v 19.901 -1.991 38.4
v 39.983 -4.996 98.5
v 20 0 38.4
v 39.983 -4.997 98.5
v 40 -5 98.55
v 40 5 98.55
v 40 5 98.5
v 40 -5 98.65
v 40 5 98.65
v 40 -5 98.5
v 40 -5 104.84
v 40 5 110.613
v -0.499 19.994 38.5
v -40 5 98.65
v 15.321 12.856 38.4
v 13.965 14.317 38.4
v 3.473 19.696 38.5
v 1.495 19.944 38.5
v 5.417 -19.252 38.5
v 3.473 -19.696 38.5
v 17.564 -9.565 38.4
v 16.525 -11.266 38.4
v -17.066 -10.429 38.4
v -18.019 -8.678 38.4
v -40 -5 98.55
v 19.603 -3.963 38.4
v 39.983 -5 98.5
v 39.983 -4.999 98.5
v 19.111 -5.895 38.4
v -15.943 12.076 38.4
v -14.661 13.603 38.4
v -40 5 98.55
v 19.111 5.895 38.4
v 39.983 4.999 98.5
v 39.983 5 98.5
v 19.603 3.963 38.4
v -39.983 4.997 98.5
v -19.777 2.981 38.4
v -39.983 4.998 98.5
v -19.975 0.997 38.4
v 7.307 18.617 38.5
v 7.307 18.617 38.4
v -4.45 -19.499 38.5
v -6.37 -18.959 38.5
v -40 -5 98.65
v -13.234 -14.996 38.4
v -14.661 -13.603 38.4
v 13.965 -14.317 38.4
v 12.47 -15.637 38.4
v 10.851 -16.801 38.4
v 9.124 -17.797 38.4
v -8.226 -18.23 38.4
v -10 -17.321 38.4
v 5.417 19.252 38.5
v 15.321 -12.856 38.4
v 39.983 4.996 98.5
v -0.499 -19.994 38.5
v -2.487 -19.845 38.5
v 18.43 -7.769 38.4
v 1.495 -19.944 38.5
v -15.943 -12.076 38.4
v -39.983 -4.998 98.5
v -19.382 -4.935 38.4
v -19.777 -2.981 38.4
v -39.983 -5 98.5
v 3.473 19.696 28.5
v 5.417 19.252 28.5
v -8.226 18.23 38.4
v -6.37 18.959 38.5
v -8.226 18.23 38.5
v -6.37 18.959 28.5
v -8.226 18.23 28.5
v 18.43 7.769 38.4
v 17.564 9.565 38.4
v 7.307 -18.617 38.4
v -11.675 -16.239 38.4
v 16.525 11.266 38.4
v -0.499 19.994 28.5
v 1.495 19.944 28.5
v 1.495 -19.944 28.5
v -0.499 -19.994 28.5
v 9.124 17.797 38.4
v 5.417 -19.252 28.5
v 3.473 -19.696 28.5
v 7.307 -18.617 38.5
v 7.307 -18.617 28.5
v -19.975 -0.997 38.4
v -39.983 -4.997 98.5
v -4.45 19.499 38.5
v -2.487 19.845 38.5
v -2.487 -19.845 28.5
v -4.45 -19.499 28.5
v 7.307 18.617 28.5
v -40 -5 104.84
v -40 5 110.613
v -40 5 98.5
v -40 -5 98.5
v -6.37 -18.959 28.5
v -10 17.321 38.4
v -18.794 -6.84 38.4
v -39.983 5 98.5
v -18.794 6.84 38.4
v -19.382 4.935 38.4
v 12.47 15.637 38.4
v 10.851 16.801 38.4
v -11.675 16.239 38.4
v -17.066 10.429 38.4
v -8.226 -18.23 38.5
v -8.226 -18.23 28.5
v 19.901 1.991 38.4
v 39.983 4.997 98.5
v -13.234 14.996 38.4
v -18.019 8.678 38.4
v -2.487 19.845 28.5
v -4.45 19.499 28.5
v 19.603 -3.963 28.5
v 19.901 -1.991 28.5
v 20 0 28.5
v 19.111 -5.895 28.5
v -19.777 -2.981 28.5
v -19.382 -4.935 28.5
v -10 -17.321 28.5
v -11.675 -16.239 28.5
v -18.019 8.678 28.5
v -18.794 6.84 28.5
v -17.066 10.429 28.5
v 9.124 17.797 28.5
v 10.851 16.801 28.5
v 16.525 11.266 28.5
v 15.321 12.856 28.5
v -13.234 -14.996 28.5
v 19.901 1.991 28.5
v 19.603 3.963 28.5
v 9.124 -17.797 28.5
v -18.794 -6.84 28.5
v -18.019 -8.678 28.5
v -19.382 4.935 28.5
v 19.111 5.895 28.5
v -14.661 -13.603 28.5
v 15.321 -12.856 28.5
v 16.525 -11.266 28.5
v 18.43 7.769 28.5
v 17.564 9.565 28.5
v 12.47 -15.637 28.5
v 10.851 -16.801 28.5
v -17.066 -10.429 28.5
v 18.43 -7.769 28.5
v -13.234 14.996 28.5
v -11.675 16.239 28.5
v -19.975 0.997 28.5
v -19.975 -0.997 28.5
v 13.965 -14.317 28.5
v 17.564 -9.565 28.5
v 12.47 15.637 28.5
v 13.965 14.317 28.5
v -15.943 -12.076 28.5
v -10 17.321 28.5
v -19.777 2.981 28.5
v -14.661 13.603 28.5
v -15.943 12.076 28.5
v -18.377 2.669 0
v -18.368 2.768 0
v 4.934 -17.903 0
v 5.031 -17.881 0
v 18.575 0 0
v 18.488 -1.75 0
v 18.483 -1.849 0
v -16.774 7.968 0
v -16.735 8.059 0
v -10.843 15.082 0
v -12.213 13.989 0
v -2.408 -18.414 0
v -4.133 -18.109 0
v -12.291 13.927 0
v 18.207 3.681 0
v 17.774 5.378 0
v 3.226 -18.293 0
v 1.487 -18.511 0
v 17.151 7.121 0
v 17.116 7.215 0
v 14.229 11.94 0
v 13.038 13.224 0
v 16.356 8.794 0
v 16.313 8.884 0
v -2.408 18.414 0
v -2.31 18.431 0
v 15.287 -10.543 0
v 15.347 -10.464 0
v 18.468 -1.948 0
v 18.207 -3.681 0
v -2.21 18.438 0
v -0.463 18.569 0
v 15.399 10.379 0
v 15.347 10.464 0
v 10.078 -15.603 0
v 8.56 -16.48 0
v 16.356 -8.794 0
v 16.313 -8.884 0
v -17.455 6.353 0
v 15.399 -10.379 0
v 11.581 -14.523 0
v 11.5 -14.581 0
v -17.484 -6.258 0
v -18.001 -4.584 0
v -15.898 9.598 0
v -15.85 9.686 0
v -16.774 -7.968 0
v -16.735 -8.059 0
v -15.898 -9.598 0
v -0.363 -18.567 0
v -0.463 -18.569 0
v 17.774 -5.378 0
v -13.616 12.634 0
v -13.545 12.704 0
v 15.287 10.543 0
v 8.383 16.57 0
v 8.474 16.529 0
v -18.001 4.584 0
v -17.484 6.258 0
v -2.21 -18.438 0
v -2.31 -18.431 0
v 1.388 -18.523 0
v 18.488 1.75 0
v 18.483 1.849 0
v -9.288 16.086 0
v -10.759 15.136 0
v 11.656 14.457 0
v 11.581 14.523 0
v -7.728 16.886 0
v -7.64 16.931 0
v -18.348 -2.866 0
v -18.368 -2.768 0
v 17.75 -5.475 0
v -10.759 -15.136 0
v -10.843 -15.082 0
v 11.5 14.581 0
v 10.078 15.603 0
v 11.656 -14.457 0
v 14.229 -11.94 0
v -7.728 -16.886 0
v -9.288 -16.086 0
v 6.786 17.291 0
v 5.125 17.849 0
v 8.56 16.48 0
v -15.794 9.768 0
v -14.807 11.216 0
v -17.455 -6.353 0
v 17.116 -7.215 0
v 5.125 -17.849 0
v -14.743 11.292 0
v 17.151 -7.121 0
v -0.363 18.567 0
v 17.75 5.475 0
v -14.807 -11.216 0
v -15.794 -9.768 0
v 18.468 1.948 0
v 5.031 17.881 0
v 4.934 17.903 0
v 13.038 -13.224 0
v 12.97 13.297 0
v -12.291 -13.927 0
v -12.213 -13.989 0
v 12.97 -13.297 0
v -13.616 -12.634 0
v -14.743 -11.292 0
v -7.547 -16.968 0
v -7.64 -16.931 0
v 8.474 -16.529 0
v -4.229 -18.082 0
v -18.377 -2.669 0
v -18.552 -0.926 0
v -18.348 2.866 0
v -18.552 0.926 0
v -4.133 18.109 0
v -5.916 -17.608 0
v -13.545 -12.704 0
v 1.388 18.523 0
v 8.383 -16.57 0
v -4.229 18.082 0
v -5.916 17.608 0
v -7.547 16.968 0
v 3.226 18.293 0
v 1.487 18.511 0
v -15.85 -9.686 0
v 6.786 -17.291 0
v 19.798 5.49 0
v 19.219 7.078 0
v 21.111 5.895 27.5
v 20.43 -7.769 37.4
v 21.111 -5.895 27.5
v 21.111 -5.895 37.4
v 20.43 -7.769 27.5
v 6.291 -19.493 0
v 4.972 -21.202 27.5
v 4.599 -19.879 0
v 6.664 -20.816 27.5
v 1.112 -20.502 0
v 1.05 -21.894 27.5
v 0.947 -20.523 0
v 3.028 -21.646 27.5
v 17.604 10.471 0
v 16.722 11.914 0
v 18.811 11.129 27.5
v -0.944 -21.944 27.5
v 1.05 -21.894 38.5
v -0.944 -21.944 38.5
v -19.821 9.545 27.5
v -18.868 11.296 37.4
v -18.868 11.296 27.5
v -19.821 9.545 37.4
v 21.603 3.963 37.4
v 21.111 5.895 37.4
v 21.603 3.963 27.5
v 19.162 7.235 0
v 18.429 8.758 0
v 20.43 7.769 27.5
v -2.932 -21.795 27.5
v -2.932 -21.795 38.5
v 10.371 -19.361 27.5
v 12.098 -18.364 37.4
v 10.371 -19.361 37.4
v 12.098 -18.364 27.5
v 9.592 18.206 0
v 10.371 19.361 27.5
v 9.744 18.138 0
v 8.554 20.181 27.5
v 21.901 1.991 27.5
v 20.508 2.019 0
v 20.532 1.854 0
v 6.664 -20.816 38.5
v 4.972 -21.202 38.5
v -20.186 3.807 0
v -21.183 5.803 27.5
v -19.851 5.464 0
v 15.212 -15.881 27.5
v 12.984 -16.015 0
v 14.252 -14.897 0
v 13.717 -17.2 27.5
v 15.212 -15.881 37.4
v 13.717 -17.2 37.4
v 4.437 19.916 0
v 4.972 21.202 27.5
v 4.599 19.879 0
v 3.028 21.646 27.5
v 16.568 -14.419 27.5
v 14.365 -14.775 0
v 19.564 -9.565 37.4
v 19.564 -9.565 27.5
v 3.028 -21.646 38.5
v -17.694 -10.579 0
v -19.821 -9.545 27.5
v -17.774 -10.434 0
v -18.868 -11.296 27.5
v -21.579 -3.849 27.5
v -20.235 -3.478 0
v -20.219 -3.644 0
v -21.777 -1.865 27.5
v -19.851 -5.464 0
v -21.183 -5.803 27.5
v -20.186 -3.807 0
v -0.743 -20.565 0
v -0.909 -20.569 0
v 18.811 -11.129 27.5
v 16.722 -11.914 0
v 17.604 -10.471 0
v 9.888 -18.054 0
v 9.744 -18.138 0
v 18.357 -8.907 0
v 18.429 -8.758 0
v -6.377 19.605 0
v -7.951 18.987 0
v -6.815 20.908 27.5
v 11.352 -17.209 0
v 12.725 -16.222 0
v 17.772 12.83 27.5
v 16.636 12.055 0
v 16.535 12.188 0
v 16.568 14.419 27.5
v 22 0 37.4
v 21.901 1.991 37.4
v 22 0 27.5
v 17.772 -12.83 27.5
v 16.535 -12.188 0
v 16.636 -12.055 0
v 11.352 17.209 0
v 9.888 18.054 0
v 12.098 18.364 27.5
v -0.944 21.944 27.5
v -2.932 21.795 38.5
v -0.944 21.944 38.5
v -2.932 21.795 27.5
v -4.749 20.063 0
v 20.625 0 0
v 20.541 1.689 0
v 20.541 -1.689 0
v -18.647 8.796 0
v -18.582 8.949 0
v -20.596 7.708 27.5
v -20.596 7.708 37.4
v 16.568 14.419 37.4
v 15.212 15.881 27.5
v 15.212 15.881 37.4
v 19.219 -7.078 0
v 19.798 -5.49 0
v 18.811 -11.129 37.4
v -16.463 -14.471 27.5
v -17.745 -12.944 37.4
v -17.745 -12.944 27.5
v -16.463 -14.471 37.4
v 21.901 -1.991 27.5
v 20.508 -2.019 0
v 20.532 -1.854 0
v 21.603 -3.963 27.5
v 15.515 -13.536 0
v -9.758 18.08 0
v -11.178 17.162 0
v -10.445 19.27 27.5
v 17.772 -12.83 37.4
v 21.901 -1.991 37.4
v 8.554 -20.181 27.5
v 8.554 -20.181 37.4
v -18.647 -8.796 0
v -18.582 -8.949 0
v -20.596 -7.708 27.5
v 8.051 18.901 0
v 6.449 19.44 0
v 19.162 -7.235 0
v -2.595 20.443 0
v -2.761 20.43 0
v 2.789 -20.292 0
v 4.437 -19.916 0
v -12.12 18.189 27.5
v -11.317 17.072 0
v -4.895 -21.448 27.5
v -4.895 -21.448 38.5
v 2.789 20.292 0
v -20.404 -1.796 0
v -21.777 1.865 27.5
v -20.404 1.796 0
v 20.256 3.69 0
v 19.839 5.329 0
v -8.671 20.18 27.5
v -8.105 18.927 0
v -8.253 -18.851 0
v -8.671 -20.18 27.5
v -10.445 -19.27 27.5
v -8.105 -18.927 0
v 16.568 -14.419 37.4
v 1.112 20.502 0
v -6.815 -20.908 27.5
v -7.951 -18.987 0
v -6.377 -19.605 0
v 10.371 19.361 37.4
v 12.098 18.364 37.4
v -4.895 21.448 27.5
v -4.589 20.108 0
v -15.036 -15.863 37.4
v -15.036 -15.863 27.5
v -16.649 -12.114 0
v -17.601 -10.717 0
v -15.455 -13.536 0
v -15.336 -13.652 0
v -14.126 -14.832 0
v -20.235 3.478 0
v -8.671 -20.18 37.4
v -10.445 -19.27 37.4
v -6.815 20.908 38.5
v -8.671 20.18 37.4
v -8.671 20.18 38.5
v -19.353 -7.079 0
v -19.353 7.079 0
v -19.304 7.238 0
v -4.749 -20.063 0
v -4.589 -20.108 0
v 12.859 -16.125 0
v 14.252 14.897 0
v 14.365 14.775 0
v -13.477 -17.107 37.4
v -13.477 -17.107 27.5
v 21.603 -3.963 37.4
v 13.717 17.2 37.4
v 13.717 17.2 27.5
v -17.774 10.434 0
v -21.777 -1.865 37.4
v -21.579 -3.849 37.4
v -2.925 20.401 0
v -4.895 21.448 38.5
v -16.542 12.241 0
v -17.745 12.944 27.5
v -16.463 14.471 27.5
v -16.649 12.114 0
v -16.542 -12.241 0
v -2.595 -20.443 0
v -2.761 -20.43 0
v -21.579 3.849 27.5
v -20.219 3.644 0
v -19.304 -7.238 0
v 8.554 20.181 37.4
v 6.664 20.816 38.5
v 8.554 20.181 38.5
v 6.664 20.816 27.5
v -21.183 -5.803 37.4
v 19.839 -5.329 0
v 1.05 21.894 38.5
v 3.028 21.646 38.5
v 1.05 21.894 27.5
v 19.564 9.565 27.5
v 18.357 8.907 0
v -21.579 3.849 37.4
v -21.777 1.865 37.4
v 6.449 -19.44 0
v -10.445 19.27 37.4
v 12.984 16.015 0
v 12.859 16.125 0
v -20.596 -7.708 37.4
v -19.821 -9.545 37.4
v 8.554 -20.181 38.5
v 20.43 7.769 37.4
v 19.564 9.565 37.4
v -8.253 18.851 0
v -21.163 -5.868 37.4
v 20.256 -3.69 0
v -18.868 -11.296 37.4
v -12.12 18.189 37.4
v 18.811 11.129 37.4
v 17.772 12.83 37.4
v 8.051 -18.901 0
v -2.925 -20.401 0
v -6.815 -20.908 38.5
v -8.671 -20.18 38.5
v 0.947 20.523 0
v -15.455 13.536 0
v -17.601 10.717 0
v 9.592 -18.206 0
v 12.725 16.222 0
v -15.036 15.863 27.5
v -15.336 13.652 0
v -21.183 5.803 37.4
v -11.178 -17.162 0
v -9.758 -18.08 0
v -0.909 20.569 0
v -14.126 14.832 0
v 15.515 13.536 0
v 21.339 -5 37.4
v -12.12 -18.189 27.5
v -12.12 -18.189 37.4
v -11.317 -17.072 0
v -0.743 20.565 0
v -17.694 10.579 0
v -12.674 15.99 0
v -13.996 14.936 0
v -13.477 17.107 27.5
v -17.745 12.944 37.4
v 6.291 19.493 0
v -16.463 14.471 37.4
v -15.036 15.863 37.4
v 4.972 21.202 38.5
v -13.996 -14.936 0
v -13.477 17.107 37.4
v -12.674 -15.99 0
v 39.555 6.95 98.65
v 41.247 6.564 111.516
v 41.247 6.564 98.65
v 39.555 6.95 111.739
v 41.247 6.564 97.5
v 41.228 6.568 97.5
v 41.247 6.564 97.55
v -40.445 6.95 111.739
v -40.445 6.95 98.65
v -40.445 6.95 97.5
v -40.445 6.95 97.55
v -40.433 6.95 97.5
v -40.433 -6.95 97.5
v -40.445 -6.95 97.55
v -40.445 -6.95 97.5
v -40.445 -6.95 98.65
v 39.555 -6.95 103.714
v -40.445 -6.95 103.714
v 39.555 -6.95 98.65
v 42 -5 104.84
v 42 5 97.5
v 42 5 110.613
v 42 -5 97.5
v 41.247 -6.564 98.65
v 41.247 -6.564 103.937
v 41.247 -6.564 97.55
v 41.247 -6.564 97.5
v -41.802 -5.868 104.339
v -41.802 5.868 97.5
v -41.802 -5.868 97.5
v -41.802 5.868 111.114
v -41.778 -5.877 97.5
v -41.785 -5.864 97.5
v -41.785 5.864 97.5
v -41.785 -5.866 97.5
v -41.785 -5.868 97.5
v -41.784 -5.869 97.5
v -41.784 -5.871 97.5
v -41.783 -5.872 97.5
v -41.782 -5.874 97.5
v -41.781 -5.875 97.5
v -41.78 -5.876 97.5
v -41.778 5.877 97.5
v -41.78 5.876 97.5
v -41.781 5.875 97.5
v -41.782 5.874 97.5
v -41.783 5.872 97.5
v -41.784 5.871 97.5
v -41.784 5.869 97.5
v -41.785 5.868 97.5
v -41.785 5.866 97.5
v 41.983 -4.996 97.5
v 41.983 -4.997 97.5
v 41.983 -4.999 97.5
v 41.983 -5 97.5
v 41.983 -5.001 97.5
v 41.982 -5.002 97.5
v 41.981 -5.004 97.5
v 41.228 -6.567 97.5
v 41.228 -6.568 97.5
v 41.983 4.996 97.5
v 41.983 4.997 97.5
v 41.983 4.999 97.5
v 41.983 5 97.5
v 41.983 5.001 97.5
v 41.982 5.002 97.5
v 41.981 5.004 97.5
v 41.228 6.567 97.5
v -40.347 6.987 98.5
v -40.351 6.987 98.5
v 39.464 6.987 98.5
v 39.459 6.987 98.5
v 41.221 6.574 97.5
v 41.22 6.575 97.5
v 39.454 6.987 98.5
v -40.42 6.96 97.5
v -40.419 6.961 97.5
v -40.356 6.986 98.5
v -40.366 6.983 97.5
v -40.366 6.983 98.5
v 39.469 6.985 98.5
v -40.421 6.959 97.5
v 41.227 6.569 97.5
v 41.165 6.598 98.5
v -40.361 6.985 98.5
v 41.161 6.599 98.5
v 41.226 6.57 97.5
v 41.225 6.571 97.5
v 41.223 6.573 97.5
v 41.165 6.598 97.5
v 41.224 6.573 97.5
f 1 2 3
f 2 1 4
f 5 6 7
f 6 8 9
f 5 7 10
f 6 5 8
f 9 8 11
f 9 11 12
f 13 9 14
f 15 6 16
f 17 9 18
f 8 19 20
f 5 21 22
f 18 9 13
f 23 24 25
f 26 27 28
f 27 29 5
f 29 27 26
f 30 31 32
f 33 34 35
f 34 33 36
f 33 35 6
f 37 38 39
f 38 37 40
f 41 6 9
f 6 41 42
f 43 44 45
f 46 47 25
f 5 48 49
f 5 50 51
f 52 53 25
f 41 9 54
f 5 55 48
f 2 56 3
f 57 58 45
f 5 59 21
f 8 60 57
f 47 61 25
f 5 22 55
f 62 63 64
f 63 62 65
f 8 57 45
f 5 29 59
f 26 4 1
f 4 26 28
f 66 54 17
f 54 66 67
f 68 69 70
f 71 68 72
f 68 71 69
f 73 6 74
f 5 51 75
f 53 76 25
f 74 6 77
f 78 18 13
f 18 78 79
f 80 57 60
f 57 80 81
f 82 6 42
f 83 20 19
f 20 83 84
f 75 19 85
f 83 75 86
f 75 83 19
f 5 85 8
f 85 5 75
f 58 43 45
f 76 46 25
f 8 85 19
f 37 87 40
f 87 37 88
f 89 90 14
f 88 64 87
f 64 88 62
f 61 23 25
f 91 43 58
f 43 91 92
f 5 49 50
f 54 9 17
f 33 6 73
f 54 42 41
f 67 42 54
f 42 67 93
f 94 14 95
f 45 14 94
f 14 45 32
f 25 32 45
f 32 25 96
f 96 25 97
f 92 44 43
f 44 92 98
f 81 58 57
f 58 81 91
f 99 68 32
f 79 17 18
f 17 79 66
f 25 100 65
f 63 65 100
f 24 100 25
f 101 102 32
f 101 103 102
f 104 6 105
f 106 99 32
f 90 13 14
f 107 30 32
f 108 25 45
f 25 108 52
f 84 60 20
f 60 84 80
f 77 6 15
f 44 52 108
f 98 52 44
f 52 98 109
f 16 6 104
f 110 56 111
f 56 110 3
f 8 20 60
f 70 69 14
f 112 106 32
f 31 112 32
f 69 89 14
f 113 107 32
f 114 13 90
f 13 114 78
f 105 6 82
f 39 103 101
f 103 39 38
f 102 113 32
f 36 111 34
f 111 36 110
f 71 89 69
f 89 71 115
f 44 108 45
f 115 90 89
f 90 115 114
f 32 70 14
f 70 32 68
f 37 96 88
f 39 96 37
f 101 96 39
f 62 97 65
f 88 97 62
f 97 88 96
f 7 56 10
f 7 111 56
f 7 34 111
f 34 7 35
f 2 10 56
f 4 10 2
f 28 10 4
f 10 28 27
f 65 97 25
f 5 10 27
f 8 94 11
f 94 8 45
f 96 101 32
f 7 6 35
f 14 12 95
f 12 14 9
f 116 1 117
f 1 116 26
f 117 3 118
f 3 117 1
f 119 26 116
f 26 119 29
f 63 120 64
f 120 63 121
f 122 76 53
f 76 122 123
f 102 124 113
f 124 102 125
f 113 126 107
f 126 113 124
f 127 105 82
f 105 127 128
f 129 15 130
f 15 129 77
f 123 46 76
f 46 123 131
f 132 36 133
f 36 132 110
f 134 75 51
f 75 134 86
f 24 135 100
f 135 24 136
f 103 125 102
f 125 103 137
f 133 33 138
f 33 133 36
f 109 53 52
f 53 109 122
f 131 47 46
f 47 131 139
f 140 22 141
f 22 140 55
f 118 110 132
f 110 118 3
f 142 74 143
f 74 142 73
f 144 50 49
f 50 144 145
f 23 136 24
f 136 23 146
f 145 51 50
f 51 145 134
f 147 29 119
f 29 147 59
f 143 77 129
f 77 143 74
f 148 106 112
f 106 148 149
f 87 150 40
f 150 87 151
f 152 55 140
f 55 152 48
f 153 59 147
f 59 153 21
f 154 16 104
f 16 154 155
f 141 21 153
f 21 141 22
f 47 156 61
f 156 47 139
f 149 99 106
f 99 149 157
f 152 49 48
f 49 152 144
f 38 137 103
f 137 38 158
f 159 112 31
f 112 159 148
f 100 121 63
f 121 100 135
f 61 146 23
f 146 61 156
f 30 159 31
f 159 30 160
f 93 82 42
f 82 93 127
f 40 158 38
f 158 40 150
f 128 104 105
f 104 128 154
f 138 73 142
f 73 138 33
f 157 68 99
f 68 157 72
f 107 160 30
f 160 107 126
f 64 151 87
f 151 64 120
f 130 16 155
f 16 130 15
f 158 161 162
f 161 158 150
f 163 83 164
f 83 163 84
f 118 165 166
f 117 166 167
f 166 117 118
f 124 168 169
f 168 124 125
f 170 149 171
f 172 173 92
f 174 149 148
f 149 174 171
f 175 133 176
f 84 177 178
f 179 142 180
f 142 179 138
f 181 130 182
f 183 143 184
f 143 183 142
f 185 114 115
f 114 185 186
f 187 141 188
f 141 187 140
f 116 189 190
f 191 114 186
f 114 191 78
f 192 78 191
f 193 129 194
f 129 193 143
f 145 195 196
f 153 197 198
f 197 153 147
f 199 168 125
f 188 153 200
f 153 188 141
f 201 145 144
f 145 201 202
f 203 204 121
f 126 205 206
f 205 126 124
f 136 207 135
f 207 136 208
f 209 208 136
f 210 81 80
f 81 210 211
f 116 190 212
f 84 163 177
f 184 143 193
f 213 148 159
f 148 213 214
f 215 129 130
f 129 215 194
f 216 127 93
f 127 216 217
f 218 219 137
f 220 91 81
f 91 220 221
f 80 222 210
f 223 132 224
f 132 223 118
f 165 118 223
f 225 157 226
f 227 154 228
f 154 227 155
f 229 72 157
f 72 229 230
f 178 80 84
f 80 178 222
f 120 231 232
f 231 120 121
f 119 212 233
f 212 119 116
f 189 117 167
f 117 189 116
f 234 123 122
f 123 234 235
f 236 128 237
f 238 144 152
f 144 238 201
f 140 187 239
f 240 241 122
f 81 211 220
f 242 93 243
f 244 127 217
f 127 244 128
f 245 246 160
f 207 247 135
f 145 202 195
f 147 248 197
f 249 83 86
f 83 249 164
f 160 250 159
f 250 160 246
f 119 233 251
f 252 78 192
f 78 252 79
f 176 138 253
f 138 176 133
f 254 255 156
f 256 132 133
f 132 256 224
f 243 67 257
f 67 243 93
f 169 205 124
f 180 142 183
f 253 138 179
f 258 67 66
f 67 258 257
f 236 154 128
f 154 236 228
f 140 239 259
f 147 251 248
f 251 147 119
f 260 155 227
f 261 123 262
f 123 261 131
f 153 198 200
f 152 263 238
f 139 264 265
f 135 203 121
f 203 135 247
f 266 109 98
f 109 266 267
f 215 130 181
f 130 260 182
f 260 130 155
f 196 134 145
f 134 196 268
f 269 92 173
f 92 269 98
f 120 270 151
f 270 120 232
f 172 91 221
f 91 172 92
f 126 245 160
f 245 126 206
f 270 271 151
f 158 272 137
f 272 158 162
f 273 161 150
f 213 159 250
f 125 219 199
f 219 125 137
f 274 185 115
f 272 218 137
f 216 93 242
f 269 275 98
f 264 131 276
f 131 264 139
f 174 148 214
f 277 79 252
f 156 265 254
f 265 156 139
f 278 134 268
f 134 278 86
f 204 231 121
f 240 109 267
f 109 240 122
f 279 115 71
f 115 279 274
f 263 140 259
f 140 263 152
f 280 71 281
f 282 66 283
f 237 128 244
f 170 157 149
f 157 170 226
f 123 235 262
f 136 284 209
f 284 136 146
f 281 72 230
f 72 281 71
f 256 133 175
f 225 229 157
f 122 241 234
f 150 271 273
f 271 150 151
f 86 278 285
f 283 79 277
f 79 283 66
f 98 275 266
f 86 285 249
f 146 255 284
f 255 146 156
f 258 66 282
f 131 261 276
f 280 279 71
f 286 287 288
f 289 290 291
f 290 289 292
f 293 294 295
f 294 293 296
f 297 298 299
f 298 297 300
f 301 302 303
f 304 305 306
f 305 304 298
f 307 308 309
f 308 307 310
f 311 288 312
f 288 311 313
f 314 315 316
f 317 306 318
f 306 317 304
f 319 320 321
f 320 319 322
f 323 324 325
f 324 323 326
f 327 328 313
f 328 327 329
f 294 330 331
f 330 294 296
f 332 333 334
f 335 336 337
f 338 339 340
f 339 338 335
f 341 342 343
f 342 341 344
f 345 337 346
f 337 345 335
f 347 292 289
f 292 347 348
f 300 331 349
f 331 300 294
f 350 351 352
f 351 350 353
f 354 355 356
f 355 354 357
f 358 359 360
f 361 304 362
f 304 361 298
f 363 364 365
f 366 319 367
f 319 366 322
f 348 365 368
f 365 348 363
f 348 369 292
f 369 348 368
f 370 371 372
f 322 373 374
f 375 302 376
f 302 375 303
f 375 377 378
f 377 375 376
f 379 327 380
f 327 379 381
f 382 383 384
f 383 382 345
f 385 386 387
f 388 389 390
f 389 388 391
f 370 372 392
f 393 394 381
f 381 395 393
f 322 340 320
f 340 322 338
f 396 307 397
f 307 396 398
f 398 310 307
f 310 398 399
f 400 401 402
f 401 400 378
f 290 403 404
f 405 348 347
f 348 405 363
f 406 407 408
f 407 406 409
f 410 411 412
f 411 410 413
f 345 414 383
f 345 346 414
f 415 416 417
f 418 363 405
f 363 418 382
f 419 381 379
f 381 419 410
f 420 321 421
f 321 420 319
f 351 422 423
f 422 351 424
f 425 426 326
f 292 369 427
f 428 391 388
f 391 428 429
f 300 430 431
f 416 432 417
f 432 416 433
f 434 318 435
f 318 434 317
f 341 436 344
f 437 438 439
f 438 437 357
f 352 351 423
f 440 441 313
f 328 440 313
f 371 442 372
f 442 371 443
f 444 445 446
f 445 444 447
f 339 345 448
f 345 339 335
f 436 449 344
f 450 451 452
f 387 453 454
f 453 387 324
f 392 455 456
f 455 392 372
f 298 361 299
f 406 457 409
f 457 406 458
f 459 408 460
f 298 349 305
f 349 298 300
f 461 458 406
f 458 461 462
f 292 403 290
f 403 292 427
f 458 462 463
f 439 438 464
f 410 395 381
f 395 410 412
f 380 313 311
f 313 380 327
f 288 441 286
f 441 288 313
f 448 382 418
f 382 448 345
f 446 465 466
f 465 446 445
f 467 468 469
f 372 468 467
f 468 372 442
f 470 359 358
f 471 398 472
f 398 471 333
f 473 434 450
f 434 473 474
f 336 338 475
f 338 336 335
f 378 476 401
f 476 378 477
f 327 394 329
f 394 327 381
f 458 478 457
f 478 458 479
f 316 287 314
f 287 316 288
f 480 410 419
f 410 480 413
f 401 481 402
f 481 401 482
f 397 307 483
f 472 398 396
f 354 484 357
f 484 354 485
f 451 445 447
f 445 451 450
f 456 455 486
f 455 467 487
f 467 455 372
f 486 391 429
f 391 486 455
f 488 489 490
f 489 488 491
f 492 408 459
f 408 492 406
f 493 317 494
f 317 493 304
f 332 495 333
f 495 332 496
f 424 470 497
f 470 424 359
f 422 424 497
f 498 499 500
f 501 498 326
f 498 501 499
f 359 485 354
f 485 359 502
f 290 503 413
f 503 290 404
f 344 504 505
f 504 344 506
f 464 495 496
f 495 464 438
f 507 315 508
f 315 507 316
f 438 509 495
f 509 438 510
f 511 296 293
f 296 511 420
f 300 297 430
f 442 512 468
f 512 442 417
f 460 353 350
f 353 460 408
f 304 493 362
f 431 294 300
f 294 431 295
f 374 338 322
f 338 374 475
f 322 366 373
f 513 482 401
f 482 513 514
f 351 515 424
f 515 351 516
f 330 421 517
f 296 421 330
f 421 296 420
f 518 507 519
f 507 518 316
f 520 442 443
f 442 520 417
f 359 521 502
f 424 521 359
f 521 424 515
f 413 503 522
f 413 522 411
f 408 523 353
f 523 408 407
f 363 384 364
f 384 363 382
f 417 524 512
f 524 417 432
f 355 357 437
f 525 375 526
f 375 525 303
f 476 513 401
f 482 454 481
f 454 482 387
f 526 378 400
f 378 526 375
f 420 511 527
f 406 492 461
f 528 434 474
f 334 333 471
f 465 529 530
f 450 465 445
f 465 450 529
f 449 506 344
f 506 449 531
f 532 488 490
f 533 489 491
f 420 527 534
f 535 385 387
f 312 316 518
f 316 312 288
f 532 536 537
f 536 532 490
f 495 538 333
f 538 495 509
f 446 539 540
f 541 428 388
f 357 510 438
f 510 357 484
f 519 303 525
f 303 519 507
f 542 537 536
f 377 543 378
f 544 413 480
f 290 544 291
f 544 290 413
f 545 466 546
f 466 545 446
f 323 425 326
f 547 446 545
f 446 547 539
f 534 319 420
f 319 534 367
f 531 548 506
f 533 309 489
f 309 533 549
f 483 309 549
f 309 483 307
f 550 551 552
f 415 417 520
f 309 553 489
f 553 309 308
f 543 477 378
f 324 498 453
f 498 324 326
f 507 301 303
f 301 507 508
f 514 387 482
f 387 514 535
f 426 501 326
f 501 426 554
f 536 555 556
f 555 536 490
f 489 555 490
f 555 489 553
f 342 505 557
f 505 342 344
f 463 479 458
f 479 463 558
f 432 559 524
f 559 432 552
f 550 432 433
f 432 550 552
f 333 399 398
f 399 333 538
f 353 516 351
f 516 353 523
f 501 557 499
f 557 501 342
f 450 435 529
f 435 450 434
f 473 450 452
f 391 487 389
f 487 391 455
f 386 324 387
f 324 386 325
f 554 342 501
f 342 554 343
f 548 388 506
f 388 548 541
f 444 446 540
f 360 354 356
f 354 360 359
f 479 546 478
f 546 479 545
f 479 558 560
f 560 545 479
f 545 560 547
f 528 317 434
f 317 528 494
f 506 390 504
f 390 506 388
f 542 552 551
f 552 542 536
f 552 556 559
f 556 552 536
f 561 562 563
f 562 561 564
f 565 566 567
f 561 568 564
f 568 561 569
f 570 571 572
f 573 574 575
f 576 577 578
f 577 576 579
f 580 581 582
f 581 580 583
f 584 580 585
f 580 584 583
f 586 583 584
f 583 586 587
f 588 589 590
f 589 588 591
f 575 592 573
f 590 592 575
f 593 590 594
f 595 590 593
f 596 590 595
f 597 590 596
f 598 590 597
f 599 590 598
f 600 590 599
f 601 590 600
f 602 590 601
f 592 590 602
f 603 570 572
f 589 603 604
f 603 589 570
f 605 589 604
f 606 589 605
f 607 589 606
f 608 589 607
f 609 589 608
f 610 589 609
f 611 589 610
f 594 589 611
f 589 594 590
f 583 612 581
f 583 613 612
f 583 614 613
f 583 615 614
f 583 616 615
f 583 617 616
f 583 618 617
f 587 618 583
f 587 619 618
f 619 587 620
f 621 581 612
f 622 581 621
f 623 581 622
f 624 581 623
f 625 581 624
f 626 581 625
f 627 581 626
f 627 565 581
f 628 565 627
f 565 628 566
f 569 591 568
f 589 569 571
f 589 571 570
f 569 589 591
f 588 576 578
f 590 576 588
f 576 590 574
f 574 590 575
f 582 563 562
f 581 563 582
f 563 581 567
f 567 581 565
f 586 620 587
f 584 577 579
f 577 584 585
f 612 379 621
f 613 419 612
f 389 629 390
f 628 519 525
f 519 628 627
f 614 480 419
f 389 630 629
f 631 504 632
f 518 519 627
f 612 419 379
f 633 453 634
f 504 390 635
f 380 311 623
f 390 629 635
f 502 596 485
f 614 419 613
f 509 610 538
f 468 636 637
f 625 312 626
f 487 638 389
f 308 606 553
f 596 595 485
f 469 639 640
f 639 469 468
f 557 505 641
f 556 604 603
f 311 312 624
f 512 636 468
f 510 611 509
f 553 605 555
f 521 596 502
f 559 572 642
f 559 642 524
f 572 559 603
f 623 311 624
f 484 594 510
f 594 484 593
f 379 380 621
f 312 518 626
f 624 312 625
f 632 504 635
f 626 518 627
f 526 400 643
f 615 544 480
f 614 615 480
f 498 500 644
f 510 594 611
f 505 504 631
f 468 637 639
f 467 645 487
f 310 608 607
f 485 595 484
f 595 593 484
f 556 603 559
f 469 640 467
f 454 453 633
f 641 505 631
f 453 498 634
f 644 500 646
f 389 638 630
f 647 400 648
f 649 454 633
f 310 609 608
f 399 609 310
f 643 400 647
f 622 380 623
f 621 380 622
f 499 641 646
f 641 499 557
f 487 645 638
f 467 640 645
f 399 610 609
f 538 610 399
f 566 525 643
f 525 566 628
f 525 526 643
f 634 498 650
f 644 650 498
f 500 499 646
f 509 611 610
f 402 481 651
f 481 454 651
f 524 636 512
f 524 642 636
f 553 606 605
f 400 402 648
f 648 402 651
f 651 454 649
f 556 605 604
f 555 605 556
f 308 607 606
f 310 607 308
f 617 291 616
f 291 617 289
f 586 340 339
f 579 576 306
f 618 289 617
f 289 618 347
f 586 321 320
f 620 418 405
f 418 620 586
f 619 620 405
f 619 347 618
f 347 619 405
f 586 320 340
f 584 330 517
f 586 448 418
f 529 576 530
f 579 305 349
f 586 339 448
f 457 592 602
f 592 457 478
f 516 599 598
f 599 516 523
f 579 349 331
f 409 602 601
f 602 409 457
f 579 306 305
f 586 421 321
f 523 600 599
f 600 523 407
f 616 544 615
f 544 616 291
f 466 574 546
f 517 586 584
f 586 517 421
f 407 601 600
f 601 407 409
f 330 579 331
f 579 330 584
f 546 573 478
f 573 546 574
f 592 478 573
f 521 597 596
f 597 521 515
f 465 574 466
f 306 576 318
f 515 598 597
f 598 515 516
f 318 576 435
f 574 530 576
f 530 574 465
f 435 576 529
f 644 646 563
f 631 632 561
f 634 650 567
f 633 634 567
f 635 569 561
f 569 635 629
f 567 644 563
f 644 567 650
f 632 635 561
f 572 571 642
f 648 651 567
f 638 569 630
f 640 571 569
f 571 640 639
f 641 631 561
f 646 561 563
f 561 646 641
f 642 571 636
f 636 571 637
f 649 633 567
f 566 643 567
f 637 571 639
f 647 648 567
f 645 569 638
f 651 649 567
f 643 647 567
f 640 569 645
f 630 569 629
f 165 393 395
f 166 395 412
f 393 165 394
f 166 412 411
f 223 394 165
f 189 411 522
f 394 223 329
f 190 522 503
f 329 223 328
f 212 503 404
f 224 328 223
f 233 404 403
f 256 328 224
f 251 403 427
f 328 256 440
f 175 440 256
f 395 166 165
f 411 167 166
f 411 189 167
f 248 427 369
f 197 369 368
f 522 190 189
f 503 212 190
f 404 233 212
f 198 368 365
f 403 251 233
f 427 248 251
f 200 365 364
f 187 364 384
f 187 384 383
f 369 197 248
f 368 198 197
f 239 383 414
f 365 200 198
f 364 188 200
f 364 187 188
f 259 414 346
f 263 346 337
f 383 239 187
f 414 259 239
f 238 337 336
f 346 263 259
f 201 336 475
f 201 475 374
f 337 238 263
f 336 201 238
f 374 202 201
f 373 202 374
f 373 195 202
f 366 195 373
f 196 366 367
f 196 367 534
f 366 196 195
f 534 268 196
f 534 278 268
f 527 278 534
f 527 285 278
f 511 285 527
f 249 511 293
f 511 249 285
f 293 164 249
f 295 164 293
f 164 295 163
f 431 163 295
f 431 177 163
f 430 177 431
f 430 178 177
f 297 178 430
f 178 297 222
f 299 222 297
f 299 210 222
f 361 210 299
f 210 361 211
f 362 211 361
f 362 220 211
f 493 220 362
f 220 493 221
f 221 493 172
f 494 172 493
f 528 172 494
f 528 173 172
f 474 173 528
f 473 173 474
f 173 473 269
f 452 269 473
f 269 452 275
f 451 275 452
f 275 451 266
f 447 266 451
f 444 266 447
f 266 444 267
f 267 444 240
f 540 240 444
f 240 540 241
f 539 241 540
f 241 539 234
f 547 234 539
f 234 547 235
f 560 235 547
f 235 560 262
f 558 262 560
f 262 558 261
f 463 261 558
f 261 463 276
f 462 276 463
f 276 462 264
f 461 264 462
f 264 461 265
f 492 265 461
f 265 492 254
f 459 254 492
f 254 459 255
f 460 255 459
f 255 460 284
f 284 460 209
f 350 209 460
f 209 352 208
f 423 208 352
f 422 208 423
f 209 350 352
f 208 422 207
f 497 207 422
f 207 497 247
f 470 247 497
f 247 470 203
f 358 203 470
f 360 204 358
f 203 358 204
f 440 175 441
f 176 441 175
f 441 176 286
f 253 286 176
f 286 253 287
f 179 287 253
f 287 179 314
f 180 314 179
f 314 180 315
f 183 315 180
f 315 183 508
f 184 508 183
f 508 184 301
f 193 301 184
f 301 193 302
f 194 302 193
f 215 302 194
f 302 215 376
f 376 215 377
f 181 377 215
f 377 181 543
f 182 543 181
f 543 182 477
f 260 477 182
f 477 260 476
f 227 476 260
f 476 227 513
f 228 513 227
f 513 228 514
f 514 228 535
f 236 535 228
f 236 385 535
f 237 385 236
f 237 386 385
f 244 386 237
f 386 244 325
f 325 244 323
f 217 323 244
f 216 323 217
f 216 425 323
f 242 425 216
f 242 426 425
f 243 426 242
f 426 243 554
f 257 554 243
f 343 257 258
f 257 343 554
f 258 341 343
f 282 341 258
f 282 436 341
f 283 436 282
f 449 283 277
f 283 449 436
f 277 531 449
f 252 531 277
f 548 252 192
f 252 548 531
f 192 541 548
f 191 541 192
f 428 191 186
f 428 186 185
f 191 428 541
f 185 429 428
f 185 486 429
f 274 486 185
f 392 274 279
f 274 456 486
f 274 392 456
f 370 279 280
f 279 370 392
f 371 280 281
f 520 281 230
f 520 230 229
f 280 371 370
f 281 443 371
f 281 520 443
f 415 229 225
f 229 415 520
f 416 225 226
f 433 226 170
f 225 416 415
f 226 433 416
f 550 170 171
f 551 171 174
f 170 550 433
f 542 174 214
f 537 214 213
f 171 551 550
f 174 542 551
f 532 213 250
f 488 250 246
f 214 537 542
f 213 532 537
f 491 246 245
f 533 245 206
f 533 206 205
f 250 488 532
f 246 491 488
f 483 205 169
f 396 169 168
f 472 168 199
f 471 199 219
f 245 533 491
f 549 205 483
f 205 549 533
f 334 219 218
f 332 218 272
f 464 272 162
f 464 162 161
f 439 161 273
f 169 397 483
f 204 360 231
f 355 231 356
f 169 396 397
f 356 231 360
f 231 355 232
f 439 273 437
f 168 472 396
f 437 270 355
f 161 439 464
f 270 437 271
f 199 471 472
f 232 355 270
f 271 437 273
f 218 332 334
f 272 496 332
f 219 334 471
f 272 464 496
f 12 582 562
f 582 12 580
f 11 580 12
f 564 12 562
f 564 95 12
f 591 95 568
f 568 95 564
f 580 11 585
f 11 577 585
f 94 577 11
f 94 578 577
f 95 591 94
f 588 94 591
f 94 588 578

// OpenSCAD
taper_d = 41;       //outer diameter at the narrowest part of the cylinder taper (make it a bit smaller than the inner diameter of your pipe
taper_len = 30;     // length of the cylinder taper
cyl_len = 10;       // lenth of the non-tapered cylinder
cyl_d = 44;         // diamter of the cylinder (widest diameter of the taper)

wall_thickness = 4; // yep, wall thickness
mouth_width = 80;   // inner width of the vacuum mouth
mouth_height = 10;  // inner height of the vacuum mouth
mouth_angle = 30;   // angle to perpendicular to cut the vacuum mouth
mouth_len = 15;     // length of the vacuum mouth before the transition to the cylinder
transition_len=60;  // length of the transition to the cylinder

module blockout(){
    
    inner_cyl = cyl_d - wall_thickness;
    inner_taper = taper_d - wall_thickness;
    
    hull(){
        translate([0,0,mouth_len + transition_len]) cylinder(h=0.1,d=inner_cyl,$fa=3);
        translate([0,0,mouth_len-0.1]) cube(size=[mouth_width,mouth_height,0.1],center=true);
    }
    translate([0,0,mouth_len/2]) cube(size=[mouth_width,mouth_height,mouth_len],center=true);

    translate([0,0,mouth_len + transition_len]) cylinder(h=cyl_len,d=inner_cyl,center=false,$fa=3);
    
    translate([0,0,mouth_len + transition_len + cyl_len]) cylinder(h=taper_len,d1=inner_cyl,d2=inner_taper,center=false,$fa=3);
}

translate([0,0,mouth_len+transition_len+cyl_len+taper_len-1.5]) rotate([180,0,0])    difference(){
        minkowski(){
            blockout();
            cylinder(h=1,d=wall_thickness);
        }
        blockout();
        translate([0,0,mouth_len+transition_len+cyl_len+taper_len]) cube(size=[100,100,3],center=true);
        rotate([mouth_angle,0,0]) cube(size=[100,200,10],center=true);
    }
